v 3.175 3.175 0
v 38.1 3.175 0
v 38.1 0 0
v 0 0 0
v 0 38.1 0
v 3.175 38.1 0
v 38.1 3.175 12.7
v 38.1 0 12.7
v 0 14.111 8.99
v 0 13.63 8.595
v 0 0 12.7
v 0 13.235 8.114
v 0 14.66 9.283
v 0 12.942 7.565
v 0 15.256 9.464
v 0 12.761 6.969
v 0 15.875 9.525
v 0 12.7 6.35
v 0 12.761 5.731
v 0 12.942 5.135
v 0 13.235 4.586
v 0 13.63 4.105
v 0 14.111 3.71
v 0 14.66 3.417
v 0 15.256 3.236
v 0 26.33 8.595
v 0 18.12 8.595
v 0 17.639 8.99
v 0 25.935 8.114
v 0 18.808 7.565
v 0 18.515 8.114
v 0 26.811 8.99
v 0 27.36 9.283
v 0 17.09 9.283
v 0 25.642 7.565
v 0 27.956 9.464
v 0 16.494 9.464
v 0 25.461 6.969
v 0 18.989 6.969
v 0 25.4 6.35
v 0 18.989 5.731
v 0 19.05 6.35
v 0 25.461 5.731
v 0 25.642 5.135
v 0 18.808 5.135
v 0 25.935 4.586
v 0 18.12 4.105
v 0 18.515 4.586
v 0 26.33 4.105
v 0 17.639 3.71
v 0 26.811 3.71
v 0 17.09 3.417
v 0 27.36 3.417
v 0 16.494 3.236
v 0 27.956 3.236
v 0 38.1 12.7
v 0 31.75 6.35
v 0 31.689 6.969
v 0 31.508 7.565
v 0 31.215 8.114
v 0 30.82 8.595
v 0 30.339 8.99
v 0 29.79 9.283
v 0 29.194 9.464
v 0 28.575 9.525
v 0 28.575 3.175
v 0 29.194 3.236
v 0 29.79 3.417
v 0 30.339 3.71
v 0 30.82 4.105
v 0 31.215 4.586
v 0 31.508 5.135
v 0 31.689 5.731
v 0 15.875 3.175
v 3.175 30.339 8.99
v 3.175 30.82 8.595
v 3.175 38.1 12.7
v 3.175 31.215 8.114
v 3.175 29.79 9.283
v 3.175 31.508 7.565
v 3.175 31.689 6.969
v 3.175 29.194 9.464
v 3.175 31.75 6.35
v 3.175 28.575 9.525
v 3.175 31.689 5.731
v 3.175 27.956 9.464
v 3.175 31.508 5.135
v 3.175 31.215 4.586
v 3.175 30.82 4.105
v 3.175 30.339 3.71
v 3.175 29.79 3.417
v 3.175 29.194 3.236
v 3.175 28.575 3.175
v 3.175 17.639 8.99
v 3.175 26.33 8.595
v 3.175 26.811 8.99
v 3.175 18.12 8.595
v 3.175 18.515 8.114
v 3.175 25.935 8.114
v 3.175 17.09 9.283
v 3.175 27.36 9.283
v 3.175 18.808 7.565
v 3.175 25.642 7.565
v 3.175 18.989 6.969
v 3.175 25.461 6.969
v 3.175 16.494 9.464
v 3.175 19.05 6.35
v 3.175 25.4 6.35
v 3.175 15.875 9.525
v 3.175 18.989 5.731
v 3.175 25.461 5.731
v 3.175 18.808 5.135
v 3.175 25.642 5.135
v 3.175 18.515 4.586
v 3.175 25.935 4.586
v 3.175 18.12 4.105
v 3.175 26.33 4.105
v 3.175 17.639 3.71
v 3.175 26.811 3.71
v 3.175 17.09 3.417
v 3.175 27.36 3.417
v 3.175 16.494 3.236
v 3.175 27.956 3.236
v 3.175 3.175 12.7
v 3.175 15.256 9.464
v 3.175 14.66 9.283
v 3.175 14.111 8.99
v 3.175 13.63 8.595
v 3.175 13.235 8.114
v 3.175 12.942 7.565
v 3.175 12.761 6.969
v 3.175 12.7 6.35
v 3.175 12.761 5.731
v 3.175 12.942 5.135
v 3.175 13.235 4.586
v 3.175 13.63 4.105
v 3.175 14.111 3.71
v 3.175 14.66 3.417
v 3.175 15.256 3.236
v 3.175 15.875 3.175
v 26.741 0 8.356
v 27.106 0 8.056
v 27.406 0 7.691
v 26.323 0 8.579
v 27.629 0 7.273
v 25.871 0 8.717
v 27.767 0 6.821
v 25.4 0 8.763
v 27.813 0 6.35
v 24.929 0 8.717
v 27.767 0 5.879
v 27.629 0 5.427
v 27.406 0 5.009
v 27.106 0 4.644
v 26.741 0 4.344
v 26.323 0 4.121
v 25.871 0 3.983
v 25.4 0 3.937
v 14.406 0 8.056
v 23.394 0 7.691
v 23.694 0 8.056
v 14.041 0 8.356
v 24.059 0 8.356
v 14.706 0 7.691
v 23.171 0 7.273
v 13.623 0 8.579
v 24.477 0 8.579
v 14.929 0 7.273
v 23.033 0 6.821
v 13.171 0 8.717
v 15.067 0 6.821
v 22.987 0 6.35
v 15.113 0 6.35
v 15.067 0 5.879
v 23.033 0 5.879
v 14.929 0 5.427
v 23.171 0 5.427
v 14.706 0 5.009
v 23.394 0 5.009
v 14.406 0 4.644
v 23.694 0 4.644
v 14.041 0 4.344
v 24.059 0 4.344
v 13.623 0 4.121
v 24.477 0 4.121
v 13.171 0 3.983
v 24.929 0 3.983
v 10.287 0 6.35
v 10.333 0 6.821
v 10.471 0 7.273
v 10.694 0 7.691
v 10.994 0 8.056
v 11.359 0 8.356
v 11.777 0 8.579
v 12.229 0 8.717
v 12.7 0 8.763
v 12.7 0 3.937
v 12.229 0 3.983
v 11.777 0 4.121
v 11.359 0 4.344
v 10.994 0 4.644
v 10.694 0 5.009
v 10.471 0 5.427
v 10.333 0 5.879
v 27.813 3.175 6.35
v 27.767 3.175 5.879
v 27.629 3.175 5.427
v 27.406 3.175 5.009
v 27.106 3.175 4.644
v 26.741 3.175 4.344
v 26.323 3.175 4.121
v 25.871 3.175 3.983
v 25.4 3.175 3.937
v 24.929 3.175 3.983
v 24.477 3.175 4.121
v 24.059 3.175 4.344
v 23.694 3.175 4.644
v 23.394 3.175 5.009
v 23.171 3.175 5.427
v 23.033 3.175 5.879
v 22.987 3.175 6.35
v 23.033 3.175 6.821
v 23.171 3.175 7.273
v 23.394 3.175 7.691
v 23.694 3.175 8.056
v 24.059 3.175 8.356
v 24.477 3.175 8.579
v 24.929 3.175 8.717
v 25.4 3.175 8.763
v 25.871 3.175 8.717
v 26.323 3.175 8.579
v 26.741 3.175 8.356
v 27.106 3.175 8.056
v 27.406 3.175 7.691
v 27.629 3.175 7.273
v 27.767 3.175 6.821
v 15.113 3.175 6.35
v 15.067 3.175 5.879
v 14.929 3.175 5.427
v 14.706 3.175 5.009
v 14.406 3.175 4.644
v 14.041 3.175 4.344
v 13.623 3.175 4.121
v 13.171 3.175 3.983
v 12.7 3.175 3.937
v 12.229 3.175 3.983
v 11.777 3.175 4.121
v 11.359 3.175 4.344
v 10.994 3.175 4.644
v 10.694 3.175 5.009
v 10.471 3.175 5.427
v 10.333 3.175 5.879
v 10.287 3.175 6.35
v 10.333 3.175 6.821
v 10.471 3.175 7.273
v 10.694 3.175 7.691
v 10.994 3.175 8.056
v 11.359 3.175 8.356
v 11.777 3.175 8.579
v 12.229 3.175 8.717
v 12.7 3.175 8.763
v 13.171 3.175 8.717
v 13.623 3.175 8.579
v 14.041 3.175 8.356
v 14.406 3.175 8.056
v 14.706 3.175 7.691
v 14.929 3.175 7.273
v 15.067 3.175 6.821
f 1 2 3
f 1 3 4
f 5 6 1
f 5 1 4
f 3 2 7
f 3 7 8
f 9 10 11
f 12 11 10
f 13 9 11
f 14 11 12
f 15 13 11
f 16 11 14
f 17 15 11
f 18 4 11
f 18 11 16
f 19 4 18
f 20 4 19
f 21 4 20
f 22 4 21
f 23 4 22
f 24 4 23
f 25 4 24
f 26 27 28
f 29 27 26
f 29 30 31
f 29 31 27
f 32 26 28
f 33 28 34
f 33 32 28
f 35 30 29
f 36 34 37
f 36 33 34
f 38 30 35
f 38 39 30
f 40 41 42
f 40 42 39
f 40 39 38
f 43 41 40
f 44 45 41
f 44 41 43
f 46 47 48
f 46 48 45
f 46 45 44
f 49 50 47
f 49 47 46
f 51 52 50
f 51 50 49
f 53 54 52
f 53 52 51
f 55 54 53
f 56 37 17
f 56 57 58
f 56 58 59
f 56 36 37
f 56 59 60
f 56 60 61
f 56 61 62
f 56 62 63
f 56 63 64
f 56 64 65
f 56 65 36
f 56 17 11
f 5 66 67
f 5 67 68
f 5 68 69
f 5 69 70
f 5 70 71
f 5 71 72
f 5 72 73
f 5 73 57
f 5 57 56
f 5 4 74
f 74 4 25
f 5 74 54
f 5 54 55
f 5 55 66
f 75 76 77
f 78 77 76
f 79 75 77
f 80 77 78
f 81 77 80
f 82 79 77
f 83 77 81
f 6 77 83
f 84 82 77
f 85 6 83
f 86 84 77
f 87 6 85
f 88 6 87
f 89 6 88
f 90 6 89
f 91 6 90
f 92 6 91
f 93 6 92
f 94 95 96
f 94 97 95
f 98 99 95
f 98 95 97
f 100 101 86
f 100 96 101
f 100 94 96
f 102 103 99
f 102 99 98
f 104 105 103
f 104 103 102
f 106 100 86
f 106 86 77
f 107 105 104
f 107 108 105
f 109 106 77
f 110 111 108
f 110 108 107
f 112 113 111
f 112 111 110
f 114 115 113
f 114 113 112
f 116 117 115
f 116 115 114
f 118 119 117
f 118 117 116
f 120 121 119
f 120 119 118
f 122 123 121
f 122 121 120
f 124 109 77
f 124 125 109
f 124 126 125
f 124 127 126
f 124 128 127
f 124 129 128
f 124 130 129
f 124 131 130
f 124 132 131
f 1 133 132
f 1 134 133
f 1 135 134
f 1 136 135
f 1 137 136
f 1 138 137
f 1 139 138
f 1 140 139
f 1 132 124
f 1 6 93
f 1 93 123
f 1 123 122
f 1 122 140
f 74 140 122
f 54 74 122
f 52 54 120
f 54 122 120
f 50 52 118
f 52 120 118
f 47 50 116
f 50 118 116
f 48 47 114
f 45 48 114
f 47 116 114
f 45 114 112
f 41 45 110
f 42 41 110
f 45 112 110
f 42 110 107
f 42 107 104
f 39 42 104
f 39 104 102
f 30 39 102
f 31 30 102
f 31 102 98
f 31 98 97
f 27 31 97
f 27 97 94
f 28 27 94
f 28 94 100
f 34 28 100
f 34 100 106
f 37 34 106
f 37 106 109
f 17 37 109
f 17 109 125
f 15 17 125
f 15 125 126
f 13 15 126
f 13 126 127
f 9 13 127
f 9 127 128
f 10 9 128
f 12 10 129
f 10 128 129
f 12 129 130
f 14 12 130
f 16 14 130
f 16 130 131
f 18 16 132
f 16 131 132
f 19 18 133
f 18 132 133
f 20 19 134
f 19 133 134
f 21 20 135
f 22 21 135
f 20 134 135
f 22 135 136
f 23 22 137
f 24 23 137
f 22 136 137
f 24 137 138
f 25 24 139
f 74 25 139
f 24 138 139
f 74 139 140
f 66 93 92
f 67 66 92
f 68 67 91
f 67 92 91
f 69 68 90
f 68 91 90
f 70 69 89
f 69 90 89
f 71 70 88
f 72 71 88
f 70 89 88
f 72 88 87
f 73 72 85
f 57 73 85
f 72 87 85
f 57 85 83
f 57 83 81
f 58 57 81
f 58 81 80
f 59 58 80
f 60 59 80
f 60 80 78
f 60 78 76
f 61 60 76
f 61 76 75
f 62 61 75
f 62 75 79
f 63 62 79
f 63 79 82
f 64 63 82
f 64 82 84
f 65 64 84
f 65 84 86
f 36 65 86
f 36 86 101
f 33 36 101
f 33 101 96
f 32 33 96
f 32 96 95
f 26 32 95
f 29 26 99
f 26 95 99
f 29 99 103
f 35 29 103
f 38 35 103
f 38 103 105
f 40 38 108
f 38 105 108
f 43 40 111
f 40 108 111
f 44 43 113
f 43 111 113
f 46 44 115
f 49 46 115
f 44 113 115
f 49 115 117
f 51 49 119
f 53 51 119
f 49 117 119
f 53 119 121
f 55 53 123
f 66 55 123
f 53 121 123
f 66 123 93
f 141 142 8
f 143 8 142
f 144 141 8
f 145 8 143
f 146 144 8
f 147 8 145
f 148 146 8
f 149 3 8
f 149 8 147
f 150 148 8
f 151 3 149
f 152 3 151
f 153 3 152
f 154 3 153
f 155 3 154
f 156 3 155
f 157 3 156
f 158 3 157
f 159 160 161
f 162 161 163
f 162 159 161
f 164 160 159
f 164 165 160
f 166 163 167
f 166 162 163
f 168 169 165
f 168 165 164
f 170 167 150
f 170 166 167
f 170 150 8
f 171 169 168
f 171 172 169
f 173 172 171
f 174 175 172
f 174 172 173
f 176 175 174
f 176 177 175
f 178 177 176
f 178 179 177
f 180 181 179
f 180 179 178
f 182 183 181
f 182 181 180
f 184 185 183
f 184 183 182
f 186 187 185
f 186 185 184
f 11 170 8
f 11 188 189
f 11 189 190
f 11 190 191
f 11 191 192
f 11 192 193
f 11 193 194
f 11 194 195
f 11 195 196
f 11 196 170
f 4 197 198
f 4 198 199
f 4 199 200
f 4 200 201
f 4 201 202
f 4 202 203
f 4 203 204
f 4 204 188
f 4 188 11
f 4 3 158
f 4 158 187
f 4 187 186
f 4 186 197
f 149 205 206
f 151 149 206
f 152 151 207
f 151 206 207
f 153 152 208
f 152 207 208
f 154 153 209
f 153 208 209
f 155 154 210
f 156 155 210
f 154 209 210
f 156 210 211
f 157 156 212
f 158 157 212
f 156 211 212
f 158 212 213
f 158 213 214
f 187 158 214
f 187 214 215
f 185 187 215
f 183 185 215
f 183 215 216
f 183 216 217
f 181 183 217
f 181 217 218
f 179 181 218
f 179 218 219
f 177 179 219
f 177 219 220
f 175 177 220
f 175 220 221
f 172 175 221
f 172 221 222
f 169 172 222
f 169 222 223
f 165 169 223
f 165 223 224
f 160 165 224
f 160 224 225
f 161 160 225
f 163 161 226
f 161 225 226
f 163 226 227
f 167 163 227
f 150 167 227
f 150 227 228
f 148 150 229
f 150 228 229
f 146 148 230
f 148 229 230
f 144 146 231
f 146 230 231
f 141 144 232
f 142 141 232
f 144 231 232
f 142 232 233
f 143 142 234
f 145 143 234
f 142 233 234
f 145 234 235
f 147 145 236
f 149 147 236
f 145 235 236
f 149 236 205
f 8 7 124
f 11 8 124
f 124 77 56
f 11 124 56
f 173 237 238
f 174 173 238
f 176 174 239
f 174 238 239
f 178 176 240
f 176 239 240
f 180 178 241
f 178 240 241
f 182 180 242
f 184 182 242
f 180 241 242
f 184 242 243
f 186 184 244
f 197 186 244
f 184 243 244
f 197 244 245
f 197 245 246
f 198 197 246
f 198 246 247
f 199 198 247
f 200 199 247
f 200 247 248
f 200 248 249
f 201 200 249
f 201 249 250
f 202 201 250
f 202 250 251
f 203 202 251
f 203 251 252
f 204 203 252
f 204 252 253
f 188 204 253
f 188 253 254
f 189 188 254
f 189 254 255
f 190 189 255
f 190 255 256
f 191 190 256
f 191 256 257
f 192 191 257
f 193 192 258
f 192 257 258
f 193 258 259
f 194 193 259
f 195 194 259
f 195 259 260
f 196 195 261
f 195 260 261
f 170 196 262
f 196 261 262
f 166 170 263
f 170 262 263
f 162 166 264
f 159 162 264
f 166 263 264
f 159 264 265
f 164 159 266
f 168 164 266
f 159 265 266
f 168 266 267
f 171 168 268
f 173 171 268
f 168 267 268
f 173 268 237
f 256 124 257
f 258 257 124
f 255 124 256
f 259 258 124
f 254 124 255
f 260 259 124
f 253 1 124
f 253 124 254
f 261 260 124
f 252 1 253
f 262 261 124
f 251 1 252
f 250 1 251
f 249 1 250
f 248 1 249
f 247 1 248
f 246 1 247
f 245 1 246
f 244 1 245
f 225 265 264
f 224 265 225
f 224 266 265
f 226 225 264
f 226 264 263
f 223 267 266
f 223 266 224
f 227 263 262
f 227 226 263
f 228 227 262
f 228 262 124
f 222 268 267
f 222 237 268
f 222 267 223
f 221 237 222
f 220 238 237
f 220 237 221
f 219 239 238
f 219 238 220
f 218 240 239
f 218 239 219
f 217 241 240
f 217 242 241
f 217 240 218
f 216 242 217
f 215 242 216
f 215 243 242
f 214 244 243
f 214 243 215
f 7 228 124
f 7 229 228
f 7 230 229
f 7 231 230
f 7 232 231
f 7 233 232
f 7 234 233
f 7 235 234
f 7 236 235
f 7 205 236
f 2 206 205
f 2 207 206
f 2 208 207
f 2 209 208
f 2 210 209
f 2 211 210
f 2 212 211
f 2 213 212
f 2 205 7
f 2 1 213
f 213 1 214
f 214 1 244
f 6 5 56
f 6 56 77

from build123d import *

# Parameters (mm, degrees)
BOSS_EXTRUDE1_DEPTH = 12.7
SKETCH2_R           = 2.413
CUT_EXTRUDE1_DEPTH  = 4.175
SKETCH3_R           = 3.175
CUT_EXTRUDE2_DEPTH  = 4.175


with BuildPart() as part:
    # Sketch1 → Boss-Extrude1 (new body)
    with BuildSketch(Plane.XY):
        Polygon((0, 0), (0, 38.1), (3.175, 38.1), (3.175, 3.175), (38.1, 3.175), (38.1, 0), align=None)
    extrude(amount=BOSS_EXTRUDE1_DEPTH)

    # Sketch2 → Cut-Extrude1 (cut, through all)
    with BuildSketch(Plane(origin=(0, 3.175, 0), x_dir=(1, 0, 0), z_dir=(0, 1, 0))):
        with Locations((12.7, -6.35)):
            Circle(SKETCH2_R)
        with Locations((25.4, -6.35)):
            Circle(SKETCH2_R)
    extrude(amount=-CUT_EXTRUDE1_DEPTH, mode=Mode.SUBTRACT)

    # Sketch3 → Cut-Extrude2 (cut, through all)
    with BuildSketch(Plane(origin=(3.175, 0, 0), x_dir=(0, 0, -1), z_dir=(1, 0, 0))):
        with Locations((-6.35, 28.575)):
            Circle(SKETCH3_R)
        with Locations((-6.35, 15.875)):
            Circle(SKETCH3_R)
    extrude(amount=-CUT_EXTRUDE2_DEPTH, mode=Mode.SUBTRACT)


solid = part.part
